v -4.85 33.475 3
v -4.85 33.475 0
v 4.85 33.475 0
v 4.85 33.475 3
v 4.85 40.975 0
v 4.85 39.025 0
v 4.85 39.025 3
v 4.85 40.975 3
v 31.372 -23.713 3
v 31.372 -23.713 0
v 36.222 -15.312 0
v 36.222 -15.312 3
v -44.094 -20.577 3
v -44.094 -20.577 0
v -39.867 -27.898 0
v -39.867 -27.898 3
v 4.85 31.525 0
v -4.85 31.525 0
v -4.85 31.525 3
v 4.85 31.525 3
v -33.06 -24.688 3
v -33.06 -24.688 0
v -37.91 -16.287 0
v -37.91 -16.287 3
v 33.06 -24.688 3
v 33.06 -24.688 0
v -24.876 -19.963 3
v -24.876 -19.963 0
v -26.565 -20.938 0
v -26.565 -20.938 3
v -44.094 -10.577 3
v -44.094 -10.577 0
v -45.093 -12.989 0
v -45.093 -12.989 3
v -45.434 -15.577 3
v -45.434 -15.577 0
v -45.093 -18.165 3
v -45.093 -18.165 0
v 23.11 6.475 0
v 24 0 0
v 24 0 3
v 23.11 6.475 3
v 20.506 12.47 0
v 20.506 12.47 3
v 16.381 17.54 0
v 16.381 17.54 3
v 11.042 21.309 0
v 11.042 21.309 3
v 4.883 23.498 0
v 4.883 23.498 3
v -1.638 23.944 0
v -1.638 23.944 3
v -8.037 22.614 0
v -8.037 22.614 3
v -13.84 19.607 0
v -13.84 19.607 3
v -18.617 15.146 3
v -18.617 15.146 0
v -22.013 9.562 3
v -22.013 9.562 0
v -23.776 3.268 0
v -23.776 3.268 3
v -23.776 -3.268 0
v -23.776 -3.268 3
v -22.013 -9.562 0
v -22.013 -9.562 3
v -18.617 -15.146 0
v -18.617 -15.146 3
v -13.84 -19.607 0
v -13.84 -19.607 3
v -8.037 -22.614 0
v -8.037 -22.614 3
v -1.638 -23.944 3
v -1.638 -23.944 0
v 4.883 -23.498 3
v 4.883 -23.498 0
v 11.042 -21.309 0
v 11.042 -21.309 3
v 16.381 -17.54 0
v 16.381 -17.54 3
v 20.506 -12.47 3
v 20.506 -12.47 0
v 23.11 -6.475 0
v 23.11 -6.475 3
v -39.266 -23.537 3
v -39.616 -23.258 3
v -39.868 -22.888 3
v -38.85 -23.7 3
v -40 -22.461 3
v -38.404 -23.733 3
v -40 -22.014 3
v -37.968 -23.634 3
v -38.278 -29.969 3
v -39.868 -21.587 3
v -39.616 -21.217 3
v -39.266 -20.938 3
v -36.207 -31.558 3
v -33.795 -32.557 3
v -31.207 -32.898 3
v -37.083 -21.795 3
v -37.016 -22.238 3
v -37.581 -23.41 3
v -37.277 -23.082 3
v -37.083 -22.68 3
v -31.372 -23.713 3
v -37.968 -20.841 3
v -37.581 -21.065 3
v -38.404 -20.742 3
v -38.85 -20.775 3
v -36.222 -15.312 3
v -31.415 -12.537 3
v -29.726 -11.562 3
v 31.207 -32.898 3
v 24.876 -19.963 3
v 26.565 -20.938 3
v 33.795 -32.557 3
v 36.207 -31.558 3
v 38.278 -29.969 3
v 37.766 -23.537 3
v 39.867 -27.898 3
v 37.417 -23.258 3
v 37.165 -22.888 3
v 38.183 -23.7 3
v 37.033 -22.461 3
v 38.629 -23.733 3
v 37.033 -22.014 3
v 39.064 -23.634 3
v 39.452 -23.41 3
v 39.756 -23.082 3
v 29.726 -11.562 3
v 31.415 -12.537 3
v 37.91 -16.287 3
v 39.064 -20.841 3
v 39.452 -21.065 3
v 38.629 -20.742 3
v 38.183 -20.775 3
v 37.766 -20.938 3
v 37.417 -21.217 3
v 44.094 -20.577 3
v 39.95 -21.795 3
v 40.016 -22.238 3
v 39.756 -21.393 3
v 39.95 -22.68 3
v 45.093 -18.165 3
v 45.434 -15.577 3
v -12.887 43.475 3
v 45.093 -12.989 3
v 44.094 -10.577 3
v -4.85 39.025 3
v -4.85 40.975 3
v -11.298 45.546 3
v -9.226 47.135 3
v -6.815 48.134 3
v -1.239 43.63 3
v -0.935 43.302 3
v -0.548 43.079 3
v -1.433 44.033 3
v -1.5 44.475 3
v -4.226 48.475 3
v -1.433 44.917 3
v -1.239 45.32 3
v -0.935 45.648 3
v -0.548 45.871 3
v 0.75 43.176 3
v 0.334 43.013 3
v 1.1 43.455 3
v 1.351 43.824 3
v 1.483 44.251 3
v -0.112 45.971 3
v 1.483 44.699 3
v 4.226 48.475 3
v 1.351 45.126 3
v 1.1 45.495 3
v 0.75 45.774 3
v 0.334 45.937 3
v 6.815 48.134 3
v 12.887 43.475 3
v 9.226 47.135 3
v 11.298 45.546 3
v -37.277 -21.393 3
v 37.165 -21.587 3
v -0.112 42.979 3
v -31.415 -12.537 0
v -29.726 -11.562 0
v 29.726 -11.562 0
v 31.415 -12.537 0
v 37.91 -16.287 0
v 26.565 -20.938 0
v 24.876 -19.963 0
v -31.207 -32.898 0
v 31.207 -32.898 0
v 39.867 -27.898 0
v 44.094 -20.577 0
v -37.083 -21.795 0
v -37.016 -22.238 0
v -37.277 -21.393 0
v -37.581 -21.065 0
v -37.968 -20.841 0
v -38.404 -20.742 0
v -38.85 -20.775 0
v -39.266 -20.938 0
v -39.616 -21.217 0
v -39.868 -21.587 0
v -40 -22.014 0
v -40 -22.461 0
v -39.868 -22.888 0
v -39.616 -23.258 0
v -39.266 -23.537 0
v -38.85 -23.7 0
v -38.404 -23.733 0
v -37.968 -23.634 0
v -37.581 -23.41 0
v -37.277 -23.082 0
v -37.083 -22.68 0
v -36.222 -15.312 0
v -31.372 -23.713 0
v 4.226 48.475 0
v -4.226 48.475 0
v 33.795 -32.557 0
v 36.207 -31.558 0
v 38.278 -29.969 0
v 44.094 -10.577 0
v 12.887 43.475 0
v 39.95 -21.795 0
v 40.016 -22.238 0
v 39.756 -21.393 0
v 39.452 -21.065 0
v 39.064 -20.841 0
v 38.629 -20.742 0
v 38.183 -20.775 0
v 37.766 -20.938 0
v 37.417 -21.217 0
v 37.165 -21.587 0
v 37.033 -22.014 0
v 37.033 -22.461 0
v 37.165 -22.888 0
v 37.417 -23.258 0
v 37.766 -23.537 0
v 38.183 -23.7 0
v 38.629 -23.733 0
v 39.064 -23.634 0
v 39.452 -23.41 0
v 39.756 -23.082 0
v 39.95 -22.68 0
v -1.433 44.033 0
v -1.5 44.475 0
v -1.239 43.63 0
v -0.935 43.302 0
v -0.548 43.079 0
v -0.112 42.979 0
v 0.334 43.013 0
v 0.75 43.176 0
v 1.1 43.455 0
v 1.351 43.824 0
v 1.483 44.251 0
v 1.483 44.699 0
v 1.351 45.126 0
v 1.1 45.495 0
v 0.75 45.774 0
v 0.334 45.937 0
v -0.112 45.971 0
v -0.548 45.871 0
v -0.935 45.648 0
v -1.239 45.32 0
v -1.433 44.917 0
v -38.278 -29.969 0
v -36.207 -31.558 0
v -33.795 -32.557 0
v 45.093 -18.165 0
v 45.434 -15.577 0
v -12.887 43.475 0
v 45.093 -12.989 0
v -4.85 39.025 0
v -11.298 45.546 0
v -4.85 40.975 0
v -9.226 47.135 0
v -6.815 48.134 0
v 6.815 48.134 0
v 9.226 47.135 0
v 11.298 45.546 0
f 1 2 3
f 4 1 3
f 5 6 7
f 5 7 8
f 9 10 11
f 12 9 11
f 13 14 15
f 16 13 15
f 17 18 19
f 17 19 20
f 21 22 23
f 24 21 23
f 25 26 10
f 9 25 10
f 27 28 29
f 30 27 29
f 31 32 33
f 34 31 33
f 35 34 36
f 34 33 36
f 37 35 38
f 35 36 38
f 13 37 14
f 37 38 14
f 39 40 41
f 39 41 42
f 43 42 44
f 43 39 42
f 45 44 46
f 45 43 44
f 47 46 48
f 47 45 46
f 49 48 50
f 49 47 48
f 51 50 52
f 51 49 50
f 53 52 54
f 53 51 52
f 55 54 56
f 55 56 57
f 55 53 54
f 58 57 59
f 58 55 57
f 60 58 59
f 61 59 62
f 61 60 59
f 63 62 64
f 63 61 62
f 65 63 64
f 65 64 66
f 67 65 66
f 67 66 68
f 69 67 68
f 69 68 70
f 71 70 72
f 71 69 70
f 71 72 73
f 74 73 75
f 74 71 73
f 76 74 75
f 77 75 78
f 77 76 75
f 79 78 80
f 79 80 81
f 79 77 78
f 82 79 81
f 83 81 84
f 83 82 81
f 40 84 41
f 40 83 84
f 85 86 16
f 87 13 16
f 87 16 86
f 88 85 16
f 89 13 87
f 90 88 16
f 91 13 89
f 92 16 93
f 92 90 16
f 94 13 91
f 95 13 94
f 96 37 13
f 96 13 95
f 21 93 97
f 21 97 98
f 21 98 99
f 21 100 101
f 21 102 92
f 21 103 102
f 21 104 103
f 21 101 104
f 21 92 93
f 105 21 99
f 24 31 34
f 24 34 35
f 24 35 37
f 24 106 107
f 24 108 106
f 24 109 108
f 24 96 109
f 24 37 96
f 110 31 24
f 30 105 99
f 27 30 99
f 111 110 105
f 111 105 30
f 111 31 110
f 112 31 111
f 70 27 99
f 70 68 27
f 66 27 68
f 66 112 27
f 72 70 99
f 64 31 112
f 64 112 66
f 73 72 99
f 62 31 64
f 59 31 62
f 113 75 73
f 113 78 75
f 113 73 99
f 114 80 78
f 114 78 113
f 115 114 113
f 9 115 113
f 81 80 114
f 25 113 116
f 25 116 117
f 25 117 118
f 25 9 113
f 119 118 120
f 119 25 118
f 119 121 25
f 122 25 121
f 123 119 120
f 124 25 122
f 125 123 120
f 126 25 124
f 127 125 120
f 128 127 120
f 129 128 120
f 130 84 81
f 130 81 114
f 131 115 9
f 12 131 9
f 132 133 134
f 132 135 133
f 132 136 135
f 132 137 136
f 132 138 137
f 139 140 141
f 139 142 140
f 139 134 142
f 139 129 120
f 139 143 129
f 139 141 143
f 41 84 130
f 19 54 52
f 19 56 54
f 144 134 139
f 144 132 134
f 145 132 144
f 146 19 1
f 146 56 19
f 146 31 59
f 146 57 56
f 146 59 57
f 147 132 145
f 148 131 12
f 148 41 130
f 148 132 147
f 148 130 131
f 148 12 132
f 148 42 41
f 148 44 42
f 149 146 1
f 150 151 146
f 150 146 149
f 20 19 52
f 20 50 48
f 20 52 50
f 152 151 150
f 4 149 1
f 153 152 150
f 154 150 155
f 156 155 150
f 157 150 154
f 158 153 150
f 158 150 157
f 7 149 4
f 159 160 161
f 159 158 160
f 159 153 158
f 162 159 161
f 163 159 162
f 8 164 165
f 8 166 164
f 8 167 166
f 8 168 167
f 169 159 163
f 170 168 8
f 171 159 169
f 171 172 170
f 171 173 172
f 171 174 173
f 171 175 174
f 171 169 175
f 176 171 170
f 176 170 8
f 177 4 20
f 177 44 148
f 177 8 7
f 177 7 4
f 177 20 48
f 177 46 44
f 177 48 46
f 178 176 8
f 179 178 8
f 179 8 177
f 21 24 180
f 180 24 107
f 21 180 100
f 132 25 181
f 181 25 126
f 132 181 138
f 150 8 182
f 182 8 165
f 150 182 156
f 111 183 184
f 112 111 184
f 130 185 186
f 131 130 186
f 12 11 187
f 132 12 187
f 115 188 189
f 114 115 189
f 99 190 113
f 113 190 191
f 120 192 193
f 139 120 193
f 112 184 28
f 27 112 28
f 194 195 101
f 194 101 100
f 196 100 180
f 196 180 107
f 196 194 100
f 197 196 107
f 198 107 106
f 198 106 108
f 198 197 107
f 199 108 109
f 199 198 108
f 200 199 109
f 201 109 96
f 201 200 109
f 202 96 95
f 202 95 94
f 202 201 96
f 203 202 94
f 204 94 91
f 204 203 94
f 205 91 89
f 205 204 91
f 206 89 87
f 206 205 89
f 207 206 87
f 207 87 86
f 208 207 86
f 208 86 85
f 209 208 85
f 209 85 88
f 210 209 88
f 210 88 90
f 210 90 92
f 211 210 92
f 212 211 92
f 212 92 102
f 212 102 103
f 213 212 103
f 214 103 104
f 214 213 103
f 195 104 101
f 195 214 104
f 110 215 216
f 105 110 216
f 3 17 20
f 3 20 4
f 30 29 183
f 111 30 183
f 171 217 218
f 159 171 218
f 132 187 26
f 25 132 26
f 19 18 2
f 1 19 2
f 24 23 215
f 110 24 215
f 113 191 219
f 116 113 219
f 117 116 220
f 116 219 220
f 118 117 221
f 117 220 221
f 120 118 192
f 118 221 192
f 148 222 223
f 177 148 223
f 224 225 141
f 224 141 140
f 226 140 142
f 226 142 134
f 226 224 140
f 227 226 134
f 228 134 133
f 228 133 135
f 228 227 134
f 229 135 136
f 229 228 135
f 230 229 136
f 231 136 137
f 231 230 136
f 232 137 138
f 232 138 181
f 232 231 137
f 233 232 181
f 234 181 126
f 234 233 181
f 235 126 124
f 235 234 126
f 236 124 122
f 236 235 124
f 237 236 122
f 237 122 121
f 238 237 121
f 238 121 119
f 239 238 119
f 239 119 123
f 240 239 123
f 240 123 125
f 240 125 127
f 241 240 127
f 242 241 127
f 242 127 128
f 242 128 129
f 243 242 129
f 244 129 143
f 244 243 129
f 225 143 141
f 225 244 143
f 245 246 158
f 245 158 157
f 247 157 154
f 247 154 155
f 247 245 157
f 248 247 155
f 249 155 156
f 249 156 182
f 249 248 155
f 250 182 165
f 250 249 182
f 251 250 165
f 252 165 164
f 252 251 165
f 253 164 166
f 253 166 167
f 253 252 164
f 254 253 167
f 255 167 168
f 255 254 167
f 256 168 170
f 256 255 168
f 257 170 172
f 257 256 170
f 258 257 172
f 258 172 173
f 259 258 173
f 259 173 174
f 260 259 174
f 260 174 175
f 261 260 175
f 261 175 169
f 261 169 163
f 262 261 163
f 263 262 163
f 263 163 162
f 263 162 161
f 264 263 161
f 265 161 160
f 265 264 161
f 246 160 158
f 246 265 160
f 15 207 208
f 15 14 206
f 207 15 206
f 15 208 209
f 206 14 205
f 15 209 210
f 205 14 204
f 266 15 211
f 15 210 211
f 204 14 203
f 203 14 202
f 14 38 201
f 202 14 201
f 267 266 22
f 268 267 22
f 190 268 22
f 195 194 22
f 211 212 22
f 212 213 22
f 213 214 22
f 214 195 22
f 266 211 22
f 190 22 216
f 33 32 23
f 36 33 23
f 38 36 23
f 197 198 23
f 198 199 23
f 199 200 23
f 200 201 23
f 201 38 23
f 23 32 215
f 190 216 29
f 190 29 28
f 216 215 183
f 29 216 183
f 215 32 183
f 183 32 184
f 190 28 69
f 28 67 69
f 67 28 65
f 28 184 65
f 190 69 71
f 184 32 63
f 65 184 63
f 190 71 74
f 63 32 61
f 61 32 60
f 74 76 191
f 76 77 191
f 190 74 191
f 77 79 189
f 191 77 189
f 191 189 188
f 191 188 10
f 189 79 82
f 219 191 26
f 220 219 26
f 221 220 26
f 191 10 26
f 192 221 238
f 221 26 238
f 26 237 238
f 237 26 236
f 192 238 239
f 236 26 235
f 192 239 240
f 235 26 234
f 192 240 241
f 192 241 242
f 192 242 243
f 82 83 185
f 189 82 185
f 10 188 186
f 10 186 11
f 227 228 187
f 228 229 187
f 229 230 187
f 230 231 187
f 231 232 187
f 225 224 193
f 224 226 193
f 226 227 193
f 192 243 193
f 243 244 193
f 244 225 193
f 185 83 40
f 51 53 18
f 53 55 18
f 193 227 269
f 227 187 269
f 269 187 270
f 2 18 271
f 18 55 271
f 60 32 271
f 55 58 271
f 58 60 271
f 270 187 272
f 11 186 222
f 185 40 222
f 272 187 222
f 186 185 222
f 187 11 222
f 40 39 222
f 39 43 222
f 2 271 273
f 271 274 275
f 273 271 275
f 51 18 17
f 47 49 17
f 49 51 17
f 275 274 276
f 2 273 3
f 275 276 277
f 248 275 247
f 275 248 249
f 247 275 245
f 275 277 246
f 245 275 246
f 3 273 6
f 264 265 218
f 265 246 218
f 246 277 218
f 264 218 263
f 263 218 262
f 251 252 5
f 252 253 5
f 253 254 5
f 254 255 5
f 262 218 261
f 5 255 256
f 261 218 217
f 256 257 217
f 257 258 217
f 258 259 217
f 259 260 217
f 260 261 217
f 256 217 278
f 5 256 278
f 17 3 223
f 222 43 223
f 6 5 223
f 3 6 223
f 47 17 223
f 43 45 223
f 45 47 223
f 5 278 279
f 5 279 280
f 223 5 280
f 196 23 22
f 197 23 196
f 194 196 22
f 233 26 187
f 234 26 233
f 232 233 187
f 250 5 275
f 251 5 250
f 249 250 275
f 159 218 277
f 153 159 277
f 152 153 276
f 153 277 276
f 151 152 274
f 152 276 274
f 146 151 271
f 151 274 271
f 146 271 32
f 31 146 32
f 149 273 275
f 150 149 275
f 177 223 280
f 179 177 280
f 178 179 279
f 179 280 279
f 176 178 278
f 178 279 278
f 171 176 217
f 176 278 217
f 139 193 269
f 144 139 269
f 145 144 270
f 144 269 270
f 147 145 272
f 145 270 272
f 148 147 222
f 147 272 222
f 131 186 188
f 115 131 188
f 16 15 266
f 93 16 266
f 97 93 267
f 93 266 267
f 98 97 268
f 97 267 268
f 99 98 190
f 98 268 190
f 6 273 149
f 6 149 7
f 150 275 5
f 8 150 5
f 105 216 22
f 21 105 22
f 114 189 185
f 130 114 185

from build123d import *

# Parameters (mm, degrees)
SKETCH_1_R      = 1.5
SKETCH_1_R_2    = 24
SKETCH_1_W      = 9.7
SKETCH_1_H      = 1.95
EXTRUDE_4_DEPTH = 3


with BuildPart() as part:
    # Эскиз1 → Бобышка-Вытянуть4 (new body)
    with BuildSketch(Plane.XY):
        with BuildLine():
            Line((-31.207078757, -32.897754038), (31.207078757, -32.897754038))
            ThreePointArc((31.207078757, -32.897754038), (36.207078757, -31.558008076), (39.867332794, -27.897754038))
            Line((39.867332794, -27.897754038), (44.093830103, -20.577245962))
            ThreePointArc((44.093830103, -20.577245962), (45.433576065, -15.577245962), (44.093830103, -10.577245962))
            Line((44.093830103, -10.577245962), (12.886751346, 43.475))
            ThreePointArc((12.886751346, 43.475), (9.226497308, 47.135254038), (4.226497308, 48.475))
            Line((4.226497308, 48.475), (-4.226497308, 48.475))
            ThreePointArc((-4.226497308, 48.475), (-9.226497308, 47.135254038), (-12.886751346, 43.475))
            Line((-12.886751346, 43.475), (-44.093830103, -10.577245962))
            ThreePointArc((-44.093830103, -10.577245962), (-45.433576065, -15.577245962), (-44.093830103, -20.577245962))
            Line((-44.093830103, -20.577245962), (-39.867332794, -27.897754038))
            ThreePointArc((-39.867332794, -27.897754038), (-36.207078757, -31.558008076), (-31.207078757, -32.897754038))
        make_face()
        with Locations((-38.516479833, -22.2375)):
            Circle(SKETCH_1_R, mode=Mode.SUBTRACT)
        with Locations(Location((0, 44.475, 0), (0, 0, 180))):
            Circle(SKETCH_1_R, mode=Mode.SUBTRACT)
        with Locations((38.516479833, -22.2375)):
            Circle(SKETCH_1_R, mode=Mode.SUBTRACT)
        Circle(SKETCH_1_R_2, mode=Mode.SUBTRACT)
        Polygon((-33.06039092, -24.687723208), (-37.91039092, -16.287276792), (-36.221641383, -15.312276792), (-31.371641383, -23.712723208), align=None, mode=Mode.SUBTRACT)
        with Locations((0, 40)):
            Rectangle(SKETCH_1_W, SKETCH_1_H, mode=Mode.SUBTRACT)
        Polygon((37.91039092, -16.287276792), (33.06039092, -24.687723208), (31.371641383, -23.712723208), (36.221641383, -15.312276792), align=None, mode=Mode.SUBTRACT)
        Polygon((-26.565200392, -20.937723208), (-31.415200392, -12.537276792), (-29.726450854, -11.562276792), (-24.876450854, -19.962723208), align=None, mode=Mode.SUBTRACT)
        with Locations((0, 32.5)):
            Rectangle(SKETCH_1_W, SKETCH_1_H, mode=Mode.SUBTRACT)
        Polygon((31.415200392, -12.537276792), (26.565200392, -20.937723208), (24.876450854, -19.962723208), (29.726450854, -11.562276792), align=None, mode=Mode.SUBTRACT)
    extrude(amount=EXTRUDE_4_DEPTH)


solid = part.part
